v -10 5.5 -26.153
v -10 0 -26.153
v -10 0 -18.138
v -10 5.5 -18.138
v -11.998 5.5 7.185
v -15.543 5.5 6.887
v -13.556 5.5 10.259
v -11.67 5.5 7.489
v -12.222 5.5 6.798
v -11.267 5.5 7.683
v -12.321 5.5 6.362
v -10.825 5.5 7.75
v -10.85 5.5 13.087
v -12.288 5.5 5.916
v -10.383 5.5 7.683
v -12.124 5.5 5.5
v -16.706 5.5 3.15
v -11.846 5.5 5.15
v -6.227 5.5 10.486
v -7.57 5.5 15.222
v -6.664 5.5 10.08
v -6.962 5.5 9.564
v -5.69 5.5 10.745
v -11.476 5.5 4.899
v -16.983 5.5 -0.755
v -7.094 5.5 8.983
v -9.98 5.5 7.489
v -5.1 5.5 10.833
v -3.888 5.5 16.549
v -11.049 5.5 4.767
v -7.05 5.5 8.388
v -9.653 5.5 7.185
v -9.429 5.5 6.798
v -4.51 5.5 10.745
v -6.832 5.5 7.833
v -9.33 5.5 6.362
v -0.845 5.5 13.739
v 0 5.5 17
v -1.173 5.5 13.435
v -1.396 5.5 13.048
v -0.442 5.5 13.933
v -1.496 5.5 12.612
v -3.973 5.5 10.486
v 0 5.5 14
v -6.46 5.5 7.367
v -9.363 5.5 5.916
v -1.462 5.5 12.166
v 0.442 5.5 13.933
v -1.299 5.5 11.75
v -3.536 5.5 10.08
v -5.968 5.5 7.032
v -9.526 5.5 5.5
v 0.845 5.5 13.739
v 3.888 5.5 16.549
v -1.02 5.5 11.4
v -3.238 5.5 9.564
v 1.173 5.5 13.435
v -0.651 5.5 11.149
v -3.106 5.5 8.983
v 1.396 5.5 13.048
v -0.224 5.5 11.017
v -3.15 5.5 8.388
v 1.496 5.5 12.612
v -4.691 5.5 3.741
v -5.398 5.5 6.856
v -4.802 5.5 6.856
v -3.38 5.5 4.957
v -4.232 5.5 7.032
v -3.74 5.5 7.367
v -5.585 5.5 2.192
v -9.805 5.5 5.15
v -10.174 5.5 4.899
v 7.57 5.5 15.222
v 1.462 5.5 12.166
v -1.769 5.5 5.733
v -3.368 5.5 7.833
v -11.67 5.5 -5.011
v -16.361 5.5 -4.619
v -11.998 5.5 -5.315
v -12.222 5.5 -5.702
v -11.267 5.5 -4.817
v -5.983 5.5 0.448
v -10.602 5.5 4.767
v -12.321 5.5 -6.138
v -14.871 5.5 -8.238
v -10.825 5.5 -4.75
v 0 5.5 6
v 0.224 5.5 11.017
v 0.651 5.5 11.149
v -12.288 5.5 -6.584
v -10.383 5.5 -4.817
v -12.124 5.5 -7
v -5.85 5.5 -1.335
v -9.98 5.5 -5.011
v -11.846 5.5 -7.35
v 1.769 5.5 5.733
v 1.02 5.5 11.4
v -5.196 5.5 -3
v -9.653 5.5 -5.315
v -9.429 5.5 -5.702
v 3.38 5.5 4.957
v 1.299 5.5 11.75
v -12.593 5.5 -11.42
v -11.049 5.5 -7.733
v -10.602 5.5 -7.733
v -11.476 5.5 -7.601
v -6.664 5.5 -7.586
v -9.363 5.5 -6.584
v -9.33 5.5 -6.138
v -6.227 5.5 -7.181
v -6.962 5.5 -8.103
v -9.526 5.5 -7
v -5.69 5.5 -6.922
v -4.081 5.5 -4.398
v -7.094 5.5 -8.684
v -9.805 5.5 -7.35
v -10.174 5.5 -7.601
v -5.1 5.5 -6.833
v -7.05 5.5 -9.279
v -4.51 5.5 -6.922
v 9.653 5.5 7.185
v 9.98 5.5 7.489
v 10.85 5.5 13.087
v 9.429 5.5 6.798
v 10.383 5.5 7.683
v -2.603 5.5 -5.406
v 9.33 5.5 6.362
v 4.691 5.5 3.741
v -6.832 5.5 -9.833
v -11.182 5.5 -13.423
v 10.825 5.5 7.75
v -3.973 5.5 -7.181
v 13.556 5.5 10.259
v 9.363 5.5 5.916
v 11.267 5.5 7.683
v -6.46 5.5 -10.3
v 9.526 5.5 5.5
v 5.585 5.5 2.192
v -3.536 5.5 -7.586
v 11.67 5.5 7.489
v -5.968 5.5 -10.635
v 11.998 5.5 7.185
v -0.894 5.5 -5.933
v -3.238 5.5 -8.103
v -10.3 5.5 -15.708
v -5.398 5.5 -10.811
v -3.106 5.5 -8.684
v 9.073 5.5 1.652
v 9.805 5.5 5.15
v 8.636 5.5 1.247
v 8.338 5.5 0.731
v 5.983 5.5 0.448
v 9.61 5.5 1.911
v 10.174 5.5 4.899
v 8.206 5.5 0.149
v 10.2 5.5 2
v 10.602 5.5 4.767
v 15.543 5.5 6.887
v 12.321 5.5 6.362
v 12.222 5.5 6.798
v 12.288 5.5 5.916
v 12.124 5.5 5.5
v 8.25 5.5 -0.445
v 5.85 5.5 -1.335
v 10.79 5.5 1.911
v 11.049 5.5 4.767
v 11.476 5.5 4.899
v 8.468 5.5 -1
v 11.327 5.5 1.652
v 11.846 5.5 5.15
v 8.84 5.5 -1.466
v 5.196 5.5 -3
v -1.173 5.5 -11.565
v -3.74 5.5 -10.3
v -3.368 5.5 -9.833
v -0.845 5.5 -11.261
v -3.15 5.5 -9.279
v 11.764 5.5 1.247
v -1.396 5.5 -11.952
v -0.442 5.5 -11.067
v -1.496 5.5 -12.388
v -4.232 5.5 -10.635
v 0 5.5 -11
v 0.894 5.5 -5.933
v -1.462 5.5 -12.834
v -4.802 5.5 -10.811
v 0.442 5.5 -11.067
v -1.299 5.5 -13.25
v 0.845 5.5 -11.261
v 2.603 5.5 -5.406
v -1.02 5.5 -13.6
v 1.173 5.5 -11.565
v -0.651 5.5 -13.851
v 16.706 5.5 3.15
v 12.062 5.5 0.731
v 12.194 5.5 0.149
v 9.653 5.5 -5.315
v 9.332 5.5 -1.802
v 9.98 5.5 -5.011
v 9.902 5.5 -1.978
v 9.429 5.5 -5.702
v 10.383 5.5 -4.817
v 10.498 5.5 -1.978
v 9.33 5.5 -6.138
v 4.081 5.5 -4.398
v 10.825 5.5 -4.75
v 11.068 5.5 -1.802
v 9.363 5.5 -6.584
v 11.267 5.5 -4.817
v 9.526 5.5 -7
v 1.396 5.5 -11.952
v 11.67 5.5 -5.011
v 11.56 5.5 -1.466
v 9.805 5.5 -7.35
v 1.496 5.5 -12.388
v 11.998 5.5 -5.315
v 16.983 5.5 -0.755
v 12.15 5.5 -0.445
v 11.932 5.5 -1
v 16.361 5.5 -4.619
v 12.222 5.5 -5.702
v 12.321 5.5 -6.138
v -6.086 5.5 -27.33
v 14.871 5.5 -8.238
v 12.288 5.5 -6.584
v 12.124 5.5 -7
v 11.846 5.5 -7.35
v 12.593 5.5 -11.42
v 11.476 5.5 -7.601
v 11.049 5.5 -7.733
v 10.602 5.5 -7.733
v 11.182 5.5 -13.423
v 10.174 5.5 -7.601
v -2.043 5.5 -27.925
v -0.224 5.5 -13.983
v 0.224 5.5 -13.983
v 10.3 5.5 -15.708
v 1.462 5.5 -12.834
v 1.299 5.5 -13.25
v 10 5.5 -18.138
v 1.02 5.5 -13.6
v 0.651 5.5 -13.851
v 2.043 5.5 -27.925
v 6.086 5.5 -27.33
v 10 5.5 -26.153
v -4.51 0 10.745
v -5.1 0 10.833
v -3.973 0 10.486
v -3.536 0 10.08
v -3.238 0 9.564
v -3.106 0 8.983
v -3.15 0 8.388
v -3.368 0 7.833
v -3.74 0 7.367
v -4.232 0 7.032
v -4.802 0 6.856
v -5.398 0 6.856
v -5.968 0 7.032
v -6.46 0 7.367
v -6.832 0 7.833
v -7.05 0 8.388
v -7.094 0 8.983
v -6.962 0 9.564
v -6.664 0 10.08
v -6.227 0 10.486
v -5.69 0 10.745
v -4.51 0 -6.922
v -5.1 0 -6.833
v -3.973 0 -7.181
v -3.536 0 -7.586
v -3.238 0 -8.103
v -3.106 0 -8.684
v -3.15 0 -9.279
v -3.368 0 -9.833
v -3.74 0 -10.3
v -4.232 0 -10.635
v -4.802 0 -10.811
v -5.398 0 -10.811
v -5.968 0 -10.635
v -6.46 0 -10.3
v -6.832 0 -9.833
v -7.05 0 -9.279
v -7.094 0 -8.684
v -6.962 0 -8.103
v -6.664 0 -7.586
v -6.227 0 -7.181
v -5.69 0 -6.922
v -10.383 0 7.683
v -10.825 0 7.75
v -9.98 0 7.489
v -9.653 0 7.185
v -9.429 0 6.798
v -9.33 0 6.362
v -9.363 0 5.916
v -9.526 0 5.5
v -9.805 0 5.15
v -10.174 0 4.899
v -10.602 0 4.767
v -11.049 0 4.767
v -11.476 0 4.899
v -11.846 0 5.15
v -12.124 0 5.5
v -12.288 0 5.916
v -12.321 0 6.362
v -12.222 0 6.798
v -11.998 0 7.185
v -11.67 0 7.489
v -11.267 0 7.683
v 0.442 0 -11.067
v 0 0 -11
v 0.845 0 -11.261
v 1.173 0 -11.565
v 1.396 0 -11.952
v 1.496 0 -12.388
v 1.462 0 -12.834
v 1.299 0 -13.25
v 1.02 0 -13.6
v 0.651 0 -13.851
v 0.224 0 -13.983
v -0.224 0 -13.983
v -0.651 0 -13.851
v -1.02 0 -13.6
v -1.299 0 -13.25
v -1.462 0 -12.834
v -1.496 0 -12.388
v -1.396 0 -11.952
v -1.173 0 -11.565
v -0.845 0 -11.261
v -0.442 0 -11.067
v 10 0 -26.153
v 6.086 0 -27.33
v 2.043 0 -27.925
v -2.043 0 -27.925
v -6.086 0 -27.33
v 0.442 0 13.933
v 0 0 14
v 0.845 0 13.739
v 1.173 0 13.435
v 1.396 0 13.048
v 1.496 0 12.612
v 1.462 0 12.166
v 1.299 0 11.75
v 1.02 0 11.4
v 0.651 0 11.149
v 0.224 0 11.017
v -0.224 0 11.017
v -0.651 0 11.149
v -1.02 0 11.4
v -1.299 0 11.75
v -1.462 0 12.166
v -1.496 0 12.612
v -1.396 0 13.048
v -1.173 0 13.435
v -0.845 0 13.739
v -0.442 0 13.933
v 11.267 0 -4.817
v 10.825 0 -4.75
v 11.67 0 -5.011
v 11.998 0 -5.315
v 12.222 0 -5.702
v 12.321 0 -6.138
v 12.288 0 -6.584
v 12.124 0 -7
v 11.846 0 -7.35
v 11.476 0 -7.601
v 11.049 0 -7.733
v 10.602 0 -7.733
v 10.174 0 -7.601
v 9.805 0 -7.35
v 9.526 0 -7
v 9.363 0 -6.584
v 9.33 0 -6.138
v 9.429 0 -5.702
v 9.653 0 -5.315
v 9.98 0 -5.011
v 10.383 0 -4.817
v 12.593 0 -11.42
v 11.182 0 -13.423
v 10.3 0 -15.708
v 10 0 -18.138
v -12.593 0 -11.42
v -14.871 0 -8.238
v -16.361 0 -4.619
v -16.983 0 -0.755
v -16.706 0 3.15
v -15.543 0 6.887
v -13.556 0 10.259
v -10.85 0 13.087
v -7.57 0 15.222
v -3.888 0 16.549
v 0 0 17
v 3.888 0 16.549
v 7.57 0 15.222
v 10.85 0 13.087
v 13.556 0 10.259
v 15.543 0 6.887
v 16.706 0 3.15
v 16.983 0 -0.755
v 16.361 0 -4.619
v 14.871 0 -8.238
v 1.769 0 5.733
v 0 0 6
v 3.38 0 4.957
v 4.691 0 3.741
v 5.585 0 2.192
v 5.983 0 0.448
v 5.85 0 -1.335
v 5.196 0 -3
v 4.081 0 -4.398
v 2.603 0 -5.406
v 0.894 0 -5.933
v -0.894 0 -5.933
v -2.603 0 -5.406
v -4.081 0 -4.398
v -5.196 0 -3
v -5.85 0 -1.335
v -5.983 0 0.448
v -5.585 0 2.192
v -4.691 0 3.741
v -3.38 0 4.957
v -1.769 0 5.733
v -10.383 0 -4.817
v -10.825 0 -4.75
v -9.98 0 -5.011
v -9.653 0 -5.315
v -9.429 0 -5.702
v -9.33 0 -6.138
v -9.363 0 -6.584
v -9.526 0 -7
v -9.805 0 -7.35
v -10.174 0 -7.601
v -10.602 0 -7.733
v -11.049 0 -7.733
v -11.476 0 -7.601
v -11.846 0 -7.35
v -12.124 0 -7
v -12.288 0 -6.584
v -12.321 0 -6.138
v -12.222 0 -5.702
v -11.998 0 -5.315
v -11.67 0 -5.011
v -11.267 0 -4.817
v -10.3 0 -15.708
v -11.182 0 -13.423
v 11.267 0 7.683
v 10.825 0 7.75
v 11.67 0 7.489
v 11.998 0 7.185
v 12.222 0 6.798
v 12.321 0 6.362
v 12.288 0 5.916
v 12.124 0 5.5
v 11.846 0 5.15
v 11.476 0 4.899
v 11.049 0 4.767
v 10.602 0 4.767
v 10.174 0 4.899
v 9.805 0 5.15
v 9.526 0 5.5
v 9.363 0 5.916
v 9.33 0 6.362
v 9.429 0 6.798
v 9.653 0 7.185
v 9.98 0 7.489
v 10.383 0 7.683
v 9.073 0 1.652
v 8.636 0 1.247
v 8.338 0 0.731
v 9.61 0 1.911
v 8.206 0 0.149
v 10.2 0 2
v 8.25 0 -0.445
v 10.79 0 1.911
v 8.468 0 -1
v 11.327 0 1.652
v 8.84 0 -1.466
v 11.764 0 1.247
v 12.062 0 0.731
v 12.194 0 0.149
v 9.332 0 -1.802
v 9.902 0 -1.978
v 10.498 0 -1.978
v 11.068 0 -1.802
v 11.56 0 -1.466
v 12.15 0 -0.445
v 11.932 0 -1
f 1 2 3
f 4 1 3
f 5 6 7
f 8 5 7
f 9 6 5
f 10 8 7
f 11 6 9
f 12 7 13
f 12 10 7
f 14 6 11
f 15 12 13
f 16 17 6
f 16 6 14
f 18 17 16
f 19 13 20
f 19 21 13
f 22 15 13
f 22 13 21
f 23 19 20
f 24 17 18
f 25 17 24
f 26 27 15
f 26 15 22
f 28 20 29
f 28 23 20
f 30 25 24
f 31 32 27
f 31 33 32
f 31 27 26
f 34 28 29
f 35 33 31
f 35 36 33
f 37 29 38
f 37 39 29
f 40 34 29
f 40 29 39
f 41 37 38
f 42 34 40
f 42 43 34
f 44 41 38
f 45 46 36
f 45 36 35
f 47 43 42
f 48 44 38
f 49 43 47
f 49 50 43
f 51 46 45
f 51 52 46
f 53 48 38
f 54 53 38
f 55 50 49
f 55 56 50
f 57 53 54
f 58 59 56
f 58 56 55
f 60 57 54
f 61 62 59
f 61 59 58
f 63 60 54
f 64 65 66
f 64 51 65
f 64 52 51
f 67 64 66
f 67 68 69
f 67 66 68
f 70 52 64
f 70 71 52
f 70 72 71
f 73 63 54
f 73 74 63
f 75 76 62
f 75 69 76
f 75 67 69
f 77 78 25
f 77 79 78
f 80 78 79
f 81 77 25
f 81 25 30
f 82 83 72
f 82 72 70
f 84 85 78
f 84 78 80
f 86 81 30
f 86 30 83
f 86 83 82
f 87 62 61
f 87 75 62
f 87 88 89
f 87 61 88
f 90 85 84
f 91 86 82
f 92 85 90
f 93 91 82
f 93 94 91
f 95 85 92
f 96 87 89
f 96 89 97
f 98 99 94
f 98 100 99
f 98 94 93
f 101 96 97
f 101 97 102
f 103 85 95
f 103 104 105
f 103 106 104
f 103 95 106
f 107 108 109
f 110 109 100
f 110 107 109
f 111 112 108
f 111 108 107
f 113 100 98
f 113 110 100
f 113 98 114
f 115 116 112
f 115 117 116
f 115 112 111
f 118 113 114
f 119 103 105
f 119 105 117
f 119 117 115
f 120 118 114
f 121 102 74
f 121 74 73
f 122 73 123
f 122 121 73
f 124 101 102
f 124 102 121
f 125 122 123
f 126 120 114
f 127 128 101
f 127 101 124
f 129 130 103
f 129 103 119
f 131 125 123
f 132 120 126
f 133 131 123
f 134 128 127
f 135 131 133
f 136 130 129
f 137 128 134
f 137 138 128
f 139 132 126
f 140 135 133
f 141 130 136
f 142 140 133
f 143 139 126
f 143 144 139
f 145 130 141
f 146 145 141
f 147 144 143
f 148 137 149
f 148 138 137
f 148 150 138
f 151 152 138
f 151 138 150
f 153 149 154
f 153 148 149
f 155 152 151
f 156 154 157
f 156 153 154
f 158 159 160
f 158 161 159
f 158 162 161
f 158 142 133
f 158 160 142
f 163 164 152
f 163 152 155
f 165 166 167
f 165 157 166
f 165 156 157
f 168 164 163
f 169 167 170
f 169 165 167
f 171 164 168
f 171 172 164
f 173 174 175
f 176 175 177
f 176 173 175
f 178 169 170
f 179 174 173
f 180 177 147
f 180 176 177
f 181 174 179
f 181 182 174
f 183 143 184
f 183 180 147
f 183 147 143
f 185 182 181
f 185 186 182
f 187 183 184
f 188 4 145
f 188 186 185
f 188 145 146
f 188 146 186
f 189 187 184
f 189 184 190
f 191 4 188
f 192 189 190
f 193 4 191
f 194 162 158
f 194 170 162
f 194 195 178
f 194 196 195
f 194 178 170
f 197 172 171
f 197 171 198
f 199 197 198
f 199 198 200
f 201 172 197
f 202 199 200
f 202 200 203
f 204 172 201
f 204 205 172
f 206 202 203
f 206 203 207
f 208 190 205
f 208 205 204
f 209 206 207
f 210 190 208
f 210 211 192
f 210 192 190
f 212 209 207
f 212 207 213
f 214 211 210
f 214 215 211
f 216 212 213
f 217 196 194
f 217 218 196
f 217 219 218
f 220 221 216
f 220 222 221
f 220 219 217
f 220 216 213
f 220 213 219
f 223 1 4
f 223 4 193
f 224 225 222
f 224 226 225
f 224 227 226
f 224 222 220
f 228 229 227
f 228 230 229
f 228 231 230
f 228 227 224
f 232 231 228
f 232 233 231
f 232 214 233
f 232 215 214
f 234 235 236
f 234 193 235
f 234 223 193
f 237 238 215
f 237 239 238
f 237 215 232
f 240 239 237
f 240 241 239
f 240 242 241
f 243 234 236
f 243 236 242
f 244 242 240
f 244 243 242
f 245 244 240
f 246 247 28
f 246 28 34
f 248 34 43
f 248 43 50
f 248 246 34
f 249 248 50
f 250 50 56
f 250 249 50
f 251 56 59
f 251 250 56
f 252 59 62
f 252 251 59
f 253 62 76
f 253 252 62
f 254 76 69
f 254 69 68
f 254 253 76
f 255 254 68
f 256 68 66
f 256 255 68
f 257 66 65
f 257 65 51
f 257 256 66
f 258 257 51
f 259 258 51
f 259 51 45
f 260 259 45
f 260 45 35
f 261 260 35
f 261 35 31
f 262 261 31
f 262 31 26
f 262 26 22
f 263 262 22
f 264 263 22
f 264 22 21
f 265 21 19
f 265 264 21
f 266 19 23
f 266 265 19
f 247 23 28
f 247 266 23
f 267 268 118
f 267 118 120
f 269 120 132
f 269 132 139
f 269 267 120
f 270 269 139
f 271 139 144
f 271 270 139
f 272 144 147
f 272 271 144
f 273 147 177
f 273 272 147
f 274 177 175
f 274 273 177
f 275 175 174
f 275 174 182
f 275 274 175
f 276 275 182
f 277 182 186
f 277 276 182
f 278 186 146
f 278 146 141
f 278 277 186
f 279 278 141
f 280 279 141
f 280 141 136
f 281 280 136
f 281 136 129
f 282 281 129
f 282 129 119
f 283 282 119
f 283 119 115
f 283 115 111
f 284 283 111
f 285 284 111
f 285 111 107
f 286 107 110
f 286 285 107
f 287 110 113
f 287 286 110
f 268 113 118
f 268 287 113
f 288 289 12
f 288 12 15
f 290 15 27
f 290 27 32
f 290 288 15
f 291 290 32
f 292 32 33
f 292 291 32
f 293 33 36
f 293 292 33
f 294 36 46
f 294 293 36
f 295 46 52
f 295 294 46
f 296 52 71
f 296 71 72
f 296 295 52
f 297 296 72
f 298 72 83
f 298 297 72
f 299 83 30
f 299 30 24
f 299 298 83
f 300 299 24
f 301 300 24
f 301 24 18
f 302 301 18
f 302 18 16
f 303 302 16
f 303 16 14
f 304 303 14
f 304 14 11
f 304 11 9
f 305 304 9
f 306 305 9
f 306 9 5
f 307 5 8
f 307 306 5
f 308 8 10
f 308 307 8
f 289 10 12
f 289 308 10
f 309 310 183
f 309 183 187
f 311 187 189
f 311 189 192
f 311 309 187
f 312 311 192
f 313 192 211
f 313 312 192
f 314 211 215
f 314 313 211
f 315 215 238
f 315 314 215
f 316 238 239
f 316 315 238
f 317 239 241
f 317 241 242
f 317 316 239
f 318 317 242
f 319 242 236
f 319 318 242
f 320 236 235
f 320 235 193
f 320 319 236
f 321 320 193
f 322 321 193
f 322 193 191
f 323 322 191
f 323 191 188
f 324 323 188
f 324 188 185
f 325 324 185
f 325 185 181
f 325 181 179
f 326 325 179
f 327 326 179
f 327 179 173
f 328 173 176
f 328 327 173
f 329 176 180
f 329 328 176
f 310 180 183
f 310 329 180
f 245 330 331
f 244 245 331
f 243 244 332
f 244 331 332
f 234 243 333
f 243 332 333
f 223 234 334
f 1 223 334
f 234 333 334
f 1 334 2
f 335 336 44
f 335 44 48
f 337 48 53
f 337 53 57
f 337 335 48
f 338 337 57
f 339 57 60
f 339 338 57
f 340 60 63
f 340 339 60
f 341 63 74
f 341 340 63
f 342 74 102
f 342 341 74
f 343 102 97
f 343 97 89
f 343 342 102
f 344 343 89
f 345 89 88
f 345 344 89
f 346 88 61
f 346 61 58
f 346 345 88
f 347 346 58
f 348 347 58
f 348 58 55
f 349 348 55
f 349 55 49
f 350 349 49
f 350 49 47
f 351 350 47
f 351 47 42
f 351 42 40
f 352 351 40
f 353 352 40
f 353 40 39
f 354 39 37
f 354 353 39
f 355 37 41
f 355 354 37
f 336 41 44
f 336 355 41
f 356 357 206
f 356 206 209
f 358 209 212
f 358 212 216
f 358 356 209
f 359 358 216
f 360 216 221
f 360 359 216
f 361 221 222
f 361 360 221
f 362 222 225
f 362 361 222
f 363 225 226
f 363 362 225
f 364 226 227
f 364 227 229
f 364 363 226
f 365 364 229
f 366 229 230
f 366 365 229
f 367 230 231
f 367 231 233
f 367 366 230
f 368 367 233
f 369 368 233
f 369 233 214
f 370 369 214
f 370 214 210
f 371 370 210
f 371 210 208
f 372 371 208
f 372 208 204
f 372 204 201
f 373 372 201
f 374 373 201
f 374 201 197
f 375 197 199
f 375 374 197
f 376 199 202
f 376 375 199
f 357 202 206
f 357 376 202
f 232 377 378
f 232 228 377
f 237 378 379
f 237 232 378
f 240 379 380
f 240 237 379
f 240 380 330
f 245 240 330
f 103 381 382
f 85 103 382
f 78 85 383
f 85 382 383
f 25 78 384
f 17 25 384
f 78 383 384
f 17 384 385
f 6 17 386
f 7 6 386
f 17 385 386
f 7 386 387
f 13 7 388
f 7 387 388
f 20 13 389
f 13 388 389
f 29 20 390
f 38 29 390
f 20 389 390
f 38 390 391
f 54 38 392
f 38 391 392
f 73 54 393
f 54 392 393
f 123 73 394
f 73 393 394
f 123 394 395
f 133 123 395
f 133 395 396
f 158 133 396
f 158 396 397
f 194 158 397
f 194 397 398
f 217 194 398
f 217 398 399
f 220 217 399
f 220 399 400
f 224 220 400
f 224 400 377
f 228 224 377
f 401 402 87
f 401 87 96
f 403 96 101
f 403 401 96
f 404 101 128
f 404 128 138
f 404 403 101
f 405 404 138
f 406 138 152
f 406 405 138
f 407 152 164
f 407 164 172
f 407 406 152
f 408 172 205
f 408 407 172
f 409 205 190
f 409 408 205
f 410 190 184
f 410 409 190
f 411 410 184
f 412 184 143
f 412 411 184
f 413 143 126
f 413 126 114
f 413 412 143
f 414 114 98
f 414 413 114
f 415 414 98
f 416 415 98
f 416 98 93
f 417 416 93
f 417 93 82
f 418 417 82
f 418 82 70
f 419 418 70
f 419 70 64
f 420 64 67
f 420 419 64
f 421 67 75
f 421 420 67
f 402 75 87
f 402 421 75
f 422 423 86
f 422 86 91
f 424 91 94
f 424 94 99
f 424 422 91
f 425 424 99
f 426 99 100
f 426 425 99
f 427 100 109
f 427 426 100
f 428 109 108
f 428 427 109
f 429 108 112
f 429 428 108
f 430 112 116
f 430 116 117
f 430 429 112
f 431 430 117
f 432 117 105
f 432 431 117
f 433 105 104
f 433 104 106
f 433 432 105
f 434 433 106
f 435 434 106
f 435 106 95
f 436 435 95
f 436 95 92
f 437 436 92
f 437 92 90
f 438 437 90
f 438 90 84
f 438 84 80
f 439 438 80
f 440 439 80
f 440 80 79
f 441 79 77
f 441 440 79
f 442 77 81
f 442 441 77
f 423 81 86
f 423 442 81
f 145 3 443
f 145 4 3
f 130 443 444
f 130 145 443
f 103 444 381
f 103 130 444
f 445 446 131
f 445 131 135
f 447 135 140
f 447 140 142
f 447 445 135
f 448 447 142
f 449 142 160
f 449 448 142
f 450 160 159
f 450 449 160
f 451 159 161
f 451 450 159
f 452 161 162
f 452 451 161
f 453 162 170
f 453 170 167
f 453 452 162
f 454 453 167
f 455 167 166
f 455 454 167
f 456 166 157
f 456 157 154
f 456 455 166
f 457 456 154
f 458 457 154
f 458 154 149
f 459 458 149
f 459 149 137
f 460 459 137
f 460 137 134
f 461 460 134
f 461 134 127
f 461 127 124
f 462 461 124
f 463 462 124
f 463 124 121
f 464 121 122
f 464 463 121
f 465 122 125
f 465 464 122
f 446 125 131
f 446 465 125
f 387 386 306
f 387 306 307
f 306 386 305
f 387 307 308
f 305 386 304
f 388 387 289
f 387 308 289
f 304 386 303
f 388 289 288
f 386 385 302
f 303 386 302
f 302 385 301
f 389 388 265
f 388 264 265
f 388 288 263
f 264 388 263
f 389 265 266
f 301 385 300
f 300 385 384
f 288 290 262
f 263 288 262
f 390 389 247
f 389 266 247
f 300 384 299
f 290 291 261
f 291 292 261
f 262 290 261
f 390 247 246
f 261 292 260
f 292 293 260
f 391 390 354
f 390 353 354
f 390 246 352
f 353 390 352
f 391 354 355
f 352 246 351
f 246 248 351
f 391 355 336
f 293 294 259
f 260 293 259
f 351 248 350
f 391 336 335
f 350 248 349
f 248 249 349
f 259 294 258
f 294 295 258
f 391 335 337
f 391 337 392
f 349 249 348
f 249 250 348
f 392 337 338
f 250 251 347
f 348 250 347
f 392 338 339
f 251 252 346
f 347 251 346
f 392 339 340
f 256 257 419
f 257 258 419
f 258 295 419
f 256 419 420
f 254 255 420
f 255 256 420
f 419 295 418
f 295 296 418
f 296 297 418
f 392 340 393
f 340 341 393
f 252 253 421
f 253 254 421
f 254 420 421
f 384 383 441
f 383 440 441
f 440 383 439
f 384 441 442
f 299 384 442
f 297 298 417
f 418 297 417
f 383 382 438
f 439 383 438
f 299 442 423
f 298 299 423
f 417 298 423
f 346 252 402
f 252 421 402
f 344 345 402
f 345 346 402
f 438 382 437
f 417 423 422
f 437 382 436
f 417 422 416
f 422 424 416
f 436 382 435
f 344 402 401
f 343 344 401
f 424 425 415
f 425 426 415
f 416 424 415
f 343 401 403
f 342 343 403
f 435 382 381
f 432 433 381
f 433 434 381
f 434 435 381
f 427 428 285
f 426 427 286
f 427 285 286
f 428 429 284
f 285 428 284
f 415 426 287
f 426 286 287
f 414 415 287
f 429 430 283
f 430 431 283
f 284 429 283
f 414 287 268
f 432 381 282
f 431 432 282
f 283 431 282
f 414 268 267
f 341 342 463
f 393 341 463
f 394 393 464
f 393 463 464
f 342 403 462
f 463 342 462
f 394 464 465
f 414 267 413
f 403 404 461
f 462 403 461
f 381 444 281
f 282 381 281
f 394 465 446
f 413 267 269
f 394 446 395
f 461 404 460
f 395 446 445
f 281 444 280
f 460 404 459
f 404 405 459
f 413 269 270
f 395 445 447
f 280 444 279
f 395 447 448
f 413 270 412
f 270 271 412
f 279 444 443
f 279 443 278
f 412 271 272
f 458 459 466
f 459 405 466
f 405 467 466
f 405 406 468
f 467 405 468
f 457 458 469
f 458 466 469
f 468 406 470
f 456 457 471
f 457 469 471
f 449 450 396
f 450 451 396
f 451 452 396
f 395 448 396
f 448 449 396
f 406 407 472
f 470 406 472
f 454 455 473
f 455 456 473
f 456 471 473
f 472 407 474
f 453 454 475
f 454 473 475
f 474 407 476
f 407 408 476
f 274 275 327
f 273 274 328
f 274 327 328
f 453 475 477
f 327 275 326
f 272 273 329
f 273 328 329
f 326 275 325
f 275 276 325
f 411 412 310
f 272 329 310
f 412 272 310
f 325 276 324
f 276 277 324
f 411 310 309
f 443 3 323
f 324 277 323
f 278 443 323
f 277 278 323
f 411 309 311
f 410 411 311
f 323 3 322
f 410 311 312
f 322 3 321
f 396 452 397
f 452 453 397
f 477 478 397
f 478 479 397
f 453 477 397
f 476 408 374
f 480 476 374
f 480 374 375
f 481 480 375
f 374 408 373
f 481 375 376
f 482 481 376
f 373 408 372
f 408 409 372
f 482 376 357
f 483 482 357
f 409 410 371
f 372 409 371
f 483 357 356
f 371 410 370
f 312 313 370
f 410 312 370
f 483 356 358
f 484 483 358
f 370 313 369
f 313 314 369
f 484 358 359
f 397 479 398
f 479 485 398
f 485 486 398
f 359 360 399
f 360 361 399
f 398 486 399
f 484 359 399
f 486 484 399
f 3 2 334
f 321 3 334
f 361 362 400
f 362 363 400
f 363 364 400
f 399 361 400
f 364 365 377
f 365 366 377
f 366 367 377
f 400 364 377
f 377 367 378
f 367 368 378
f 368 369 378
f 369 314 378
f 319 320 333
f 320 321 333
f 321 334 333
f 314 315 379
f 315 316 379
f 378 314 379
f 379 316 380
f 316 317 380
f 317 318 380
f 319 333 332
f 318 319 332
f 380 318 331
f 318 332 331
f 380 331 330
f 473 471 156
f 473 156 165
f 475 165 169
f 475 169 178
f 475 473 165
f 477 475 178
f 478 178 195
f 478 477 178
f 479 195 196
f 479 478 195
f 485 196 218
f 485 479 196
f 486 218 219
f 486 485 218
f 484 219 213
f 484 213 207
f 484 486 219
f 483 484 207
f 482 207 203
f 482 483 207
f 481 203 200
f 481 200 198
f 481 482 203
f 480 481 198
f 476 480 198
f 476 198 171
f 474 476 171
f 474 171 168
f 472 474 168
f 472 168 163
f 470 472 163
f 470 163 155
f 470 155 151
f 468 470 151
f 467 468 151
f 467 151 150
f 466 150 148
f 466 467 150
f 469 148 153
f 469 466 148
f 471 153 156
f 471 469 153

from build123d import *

# Parameters (mm, degrees)
SKETCH_1_R      = 2
SKETCH_1_R_2    = 1.5
SKETCH_1_R_3    = 6
EXTRUDE_1_DEPTH = 5.5
FILLET_1_R      = 10


with BuildPart() as part:
    # 草图1 → 凸台-拉伸1 (new body)
    with BuildSketch(Plane(origin=(0, 0, 0), x_dir=(1, 0, 0), z_dir=(0, 1, 0))):
        with BuildLine():
            Line((-10, 26.153393661), (-10, 13.747727085))
            ThreePointArc((-10, 13.747727085), (0, -17), (10, 13.747727085))
            Line((10, 13.747727085), (10, 26.153393661))
            ThreePointArc((10, 26.153393661), (0, 28), (-10, 26.153393661))
        make_face()
        with Locations(Location((-5.1, 8.833459119, 0), (0, 0, 270))):
            Circle(SKETCH_1_R, mode=Mode.SUBTRACT)
        with Locations(Location((-10.825317547, 6.25, 0), (0, 0, 270))):
            Circle(SKETCH_1_R_2, mode=Mode.SUBTRACT)
        with Locations(Location((10.2, 0, 0), (0, 0, 270))):
            Circle(SKETCH_1_R, mode=Mode.SUBTRACT)
        with Locations(Location((-5.1, -8.833459119, 0), (0, 0, 270))):
            Circle(SKETCH_1_R, mode=Mode.SUBTRACT)
        with Locations(Location((0, 12.5, 0), (0, 0, 270))):
            Circle(SKETCH_1_R_2, mode=Mode.SUBTRACT)
        with Locations(Location((10.825317547, 6.25, 0), (0, 0, 270))):
            Circle(SKETCH_1_R_2, mode=Mode.SUBTRACT)
        with Locations(Location((10.825317547, -6.25, 0), (0, 0, 270))):
            Circle(SKETCH_1_R_2, mode=Mode.SUBTRACT)
        with Locations(Location((0, -12.5, 0), (0, 0, 270))):
            Circle(SKETCH_1_R_2, mode=Mode.SUBTRACT)
        with Locations(Location((-10.825317547, -6.25, 0), (0, 0, 270))):
            Circle(SKETCH_1_R_2, mode=Mode.SUBTRACT)
        with Locations(Location((0, 0, 0), (0, 0, 270))):
            Circle(SKETCH_1_R_3, mode=Mode.SUBTRACT)
    extrude(amount=EXTRUDE_1_DEPTH)

    # 圆角1
    fillet_1_edges = [part.edges().sort_by_distance(p)[0] for p in [
        (10, 2.75, -13.747727085),
        (-10, 2.75, -13.747727085),
    ]]
    fillet(fillet_1_edges, radius=FILLET_1_R)


solid = part.part
